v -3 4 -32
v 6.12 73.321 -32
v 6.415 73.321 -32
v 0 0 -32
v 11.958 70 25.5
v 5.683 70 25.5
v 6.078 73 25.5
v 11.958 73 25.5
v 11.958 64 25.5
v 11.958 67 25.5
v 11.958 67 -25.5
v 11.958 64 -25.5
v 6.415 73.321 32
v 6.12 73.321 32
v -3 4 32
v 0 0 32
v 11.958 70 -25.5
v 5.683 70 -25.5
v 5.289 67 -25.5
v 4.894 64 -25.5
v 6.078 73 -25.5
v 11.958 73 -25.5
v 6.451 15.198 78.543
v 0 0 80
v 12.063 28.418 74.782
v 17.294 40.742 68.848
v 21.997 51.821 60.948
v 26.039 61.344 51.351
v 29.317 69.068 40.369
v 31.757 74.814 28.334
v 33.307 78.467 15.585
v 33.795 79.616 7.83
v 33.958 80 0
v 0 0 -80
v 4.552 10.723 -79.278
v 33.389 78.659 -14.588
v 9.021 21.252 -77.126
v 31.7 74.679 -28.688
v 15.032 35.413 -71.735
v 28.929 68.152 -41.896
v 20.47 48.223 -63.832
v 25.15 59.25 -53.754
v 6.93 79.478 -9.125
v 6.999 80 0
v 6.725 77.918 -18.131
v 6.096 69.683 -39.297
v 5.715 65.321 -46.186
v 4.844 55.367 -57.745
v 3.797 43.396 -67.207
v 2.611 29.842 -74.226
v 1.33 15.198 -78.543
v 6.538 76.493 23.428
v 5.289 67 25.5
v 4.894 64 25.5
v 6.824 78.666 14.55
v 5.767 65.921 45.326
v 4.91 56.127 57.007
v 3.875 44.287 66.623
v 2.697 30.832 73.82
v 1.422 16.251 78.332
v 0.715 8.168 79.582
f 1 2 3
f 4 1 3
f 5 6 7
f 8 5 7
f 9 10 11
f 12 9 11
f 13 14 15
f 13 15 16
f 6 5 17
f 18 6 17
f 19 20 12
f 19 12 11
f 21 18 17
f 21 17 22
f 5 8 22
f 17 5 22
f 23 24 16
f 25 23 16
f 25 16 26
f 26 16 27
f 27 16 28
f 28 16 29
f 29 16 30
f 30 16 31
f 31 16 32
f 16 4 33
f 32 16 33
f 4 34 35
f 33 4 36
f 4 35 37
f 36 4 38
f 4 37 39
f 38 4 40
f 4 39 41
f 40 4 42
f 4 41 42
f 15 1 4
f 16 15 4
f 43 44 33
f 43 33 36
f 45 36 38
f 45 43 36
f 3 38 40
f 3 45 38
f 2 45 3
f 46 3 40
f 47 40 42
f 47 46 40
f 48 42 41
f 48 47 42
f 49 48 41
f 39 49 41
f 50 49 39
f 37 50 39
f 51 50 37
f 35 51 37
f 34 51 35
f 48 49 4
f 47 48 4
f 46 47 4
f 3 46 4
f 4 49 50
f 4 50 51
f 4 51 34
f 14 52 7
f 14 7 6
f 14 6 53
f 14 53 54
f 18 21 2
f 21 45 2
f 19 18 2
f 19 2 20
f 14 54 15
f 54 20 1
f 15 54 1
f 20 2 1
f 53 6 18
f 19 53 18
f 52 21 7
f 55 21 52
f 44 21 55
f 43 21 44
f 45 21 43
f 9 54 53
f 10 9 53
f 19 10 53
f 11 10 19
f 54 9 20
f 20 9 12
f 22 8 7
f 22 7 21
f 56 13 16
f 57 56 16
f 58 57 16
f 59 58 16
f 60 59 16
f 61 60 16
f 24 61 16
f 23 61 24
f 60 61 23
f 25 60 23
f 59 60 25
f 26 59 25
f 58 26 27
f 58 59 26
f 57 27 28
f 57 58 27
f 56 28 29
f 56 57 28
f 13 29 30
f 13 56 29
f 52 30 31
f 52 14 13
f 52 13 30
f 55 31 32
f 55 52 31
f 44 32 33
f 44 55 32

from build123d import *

# Parameters (mm, degrees)
EXTRUDE_1_DEPTH      = 80
EXTRUDE_1_DEPTH_BACK = 80
EXTRUDE_2_DEPTH      = 32
EXTRUDE_2_DEPTH_BACK = 32
CUT_EXTRUDE_6_DEPTH  = 33.957985297
CUT_EXTRUDE_START    = -22
SKETCH_14_W          = 51
SKETCH_14_H          = 3
CUT_EXTRUDE_7_DEPTH  = 98.020555692


# Read off the part's stored shape, not the designer's step: Вырез-Вытянуть6
with BuildPart() as part:
    # Эскиз11 → Бобышка-Вытянуть1 (new, two sides: drawn at the far end of the back side and taken through both)
    with BuildSketch(Plane.XY.offset(-EXTRUDE_1_DEPTH_BACK)):
        Polygon((0, 0), (33.957985297, 80), (6.999093082, 80), align=None)
    extrude(amount=EXTRUDE_1_DEPTH + EXTRUDE_1_DEPTH_BACK)

    # Эскиз13 → Бобышка-Вытянуть2 (add, two sides: drawn at the far end of the back side and taken through both)
    with BuildSketch(Plane.XY.offset(-EXTRUDE_2_DEPTH_BACK)):
        Polygon((6.999093082, 80), (-3, 4), (0, 0), align=None)
    extrude(amount=EXTRUDE_2_DEPTH + EXTRUDE_2_DEPTH_BACK)

    # Вырез-Вытянуть6 outline → Вырез-Вытянуть6 (cut)
    with BuildSketch(Plane(origin=(0, 0, 0), x_dir=(0, 0, -1), z_dir=(1, 0, 0))):
        with BuildLine():
            Line((-80, 80), (-80, 0))
            ThreePointArc((-80, 0), (-56.568542382, 56.568542608), (3.2e-07, 80))
            Line((3.2e-07, 80), (-80, 80))
        make_face()
        with BuildLine():
            ThreePointArc((3.2e-07, 80), (56.568542608, 56.568542382), (80, 0))
            Line((80, 0), (80, 80))
            Line((80, 80), (3.2e-07, 80))
        make_face()
    extrude(amount=CUT_EXTRUDE_6_DEPTH, mode=Mode.SUBTRACT)

    # Эскиз14 → Вырез-Вытянуть7 (cut, through all)
    with BuildSketch(Plane(origin=(33.957985297, 0, 0), x_dir=(0, 0, -1), z_dir=(1, 0, 0)).offset(CUT_EXTRUDE_START)):
        with Locations((0, 71.5)):
            Rectangle(SKETCH_14_W, SKETCH_14_H)
        with Locations((0, 65.5)):
            Rectangle(SKETCH_14_W, SKETCH_14_H)
    extrude(amount=-CUT_EXTRUDE_7_DEPTH, mode=Mode.SUBTRACT)


solid = part.part
